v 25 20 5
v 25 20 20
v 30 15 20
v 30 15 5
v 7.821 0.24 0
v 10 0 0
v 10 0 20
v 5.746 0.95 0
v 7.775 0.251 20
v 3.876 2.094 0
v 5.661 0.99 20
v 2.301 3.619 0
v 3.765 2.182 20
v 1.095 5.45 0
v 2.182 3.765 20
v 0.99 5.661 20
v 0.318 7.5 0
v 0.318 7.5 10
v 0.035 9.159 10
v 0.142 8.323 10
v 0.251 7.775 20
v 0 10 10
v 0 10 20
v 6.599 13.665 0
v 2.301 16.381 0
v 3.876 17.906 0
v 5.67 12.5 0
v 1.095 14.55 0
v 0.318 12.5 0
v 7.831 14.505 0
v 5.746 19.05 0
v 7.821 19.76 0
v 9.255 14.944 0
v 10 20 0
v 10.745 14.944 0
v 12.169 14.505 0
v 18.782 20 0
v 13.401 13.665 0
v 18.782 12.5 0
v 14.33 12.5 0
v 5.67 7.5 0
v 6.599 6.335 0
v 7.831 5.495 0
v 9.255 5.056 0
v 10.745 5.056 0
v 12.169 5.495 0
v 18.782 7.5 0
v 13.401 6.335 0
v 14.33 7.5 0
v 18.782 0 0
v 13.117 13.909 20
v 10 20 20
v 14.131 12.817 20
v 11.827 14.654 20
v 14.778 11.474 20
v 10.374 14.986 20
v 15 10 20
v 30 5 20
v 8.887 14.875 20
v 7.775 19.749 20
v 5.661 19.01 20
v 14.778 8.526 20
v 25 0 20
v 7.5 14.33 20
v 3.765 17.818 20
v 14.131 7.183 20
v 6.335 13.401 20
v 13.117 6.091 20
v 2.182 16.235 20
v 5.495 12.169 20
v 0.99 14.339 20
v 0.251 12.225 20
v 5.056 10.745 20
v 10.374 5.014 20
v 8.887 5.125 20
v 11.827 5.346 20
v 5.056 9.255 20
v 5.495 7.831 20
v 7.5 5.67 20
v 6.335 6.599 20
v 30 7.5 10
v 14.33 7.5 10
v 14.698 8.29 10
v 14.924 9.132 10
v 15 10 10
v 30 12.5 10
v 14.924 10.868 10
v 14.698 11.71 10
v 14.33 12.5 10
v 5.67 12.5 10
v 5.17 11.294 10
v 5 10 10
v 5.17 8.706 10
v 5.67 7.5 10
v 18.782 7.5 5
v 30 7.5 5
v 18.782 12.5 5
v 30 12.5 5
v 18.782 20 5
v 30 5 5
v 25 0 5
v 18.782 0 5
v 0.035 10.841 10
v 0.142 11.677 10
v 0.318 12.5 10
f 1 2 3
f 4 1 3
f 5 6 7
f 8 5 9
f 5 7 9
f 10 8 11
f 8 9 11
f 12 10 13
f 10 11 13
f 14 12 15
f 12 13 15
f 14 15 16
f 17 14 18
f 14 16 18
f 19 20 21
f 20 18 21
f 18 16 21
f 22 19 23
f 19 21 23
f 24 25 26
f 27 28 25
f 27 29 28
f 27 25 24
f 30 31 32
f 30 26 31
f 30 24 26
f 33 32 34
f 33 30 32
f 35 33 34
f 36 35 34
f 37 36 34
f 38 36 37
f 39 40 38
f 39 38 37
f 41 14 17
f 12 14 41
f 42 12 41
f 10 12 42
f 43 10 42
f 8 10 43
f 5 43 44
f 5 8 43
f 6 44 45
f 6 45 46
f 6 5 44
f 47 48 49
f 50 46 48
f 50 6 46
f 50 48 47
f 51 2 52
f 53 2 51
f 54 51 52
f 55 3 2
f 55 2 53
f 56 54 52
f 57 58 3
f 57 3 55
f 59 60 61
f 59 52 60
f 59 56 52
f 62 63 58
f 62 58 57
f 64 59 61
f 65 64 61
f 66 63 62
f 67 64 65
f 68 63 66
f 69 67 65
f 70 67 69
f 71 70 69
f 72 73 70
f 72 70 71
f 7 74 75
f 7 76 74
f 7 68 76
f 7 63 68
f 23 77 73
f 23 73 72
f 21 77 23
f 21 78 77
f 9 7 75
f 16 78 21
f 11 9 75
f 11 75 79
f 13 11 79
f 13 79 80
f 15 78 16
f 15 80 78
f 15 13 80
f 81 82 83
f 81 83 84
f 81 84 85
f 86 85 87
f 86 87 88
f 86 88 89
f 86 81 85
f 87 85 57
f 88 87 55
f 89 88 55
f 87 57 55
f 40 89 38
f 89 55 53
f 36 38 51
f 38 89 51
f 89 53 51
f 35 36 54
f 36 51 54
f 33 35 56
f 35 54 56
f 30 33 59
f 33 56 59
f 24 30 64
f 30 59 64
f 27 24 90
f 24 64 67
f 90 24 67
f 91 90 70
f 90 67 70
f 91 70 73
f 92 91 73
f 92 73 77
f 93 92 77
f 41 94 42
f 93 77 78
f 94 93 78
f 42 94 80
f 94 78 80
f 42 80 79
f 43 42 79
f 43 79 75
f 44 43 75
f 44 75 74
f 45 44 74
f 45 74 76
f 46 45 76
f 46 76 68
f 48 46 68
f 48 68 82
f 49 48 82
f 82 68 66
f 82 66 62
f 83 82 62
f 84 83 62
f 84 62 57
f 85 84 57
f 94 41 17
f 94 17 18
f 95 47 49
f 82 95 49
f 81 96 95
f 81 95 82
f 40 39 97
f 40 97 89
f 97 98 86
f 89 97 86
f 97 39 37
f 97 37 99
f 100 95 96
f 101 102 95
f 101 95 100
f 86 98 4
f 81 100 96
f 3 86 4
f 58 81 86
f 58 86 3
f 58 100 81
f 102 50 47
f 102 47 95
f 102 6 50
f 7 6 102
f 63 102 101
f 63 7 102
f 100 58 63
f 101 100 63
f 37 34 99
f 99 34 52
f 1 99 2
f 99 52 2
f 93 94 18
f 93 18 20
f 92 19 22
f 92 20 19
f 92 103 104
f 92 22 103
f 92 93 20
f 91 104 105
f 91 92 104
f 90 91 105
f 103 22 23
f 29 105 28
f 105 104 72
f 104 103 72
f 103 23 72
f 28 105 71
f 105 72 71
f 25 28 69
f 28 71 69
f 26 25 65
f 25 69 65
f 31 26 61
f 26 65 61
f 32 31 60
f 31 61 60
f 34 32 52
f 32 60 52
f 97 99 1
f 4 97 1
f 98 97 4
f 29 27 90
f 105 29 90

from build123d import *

# Parameters (mm, degrees)
F1_DEPTH  = 20
F3_DEPTH  = 25
F4_DEPTH  = 25
F6_DEPTH  = 25
F7_DEPTH  = 25
F2_R      = 5
F8_DEPTH  = 30
F5_W      = 5
F5_H      = 5
F9_DEPTH  = 50
F10_DEPTH = 50


with BuildPart() as f1:
    # F0 (on Front) → F1 (new body)
    with BuildSketch(Plane.XZ):
        Polygon((0, 20), (0, 0), (18.7821621219, 0), (18.7821621219, 5), (30, 5), (30, 20), align=None)
    extrude(amount=-F1_DEPTH)

    # F2 (on face) → F3 (cut)
    with BuildSketch(Plane.XY.offset(20)):
        with BuildLine():
            ThreePointArc((0, 10), (2.9289321881, 17.0710678119), (10, 20))
            Line((10, 20), (0, 20))
            Line((0, 20), (0, 10))
        make_face()
    extrude(amount=-F3_DEPTH, mode=Mode.SUBTRACT)

    # F2 (on face) → F4 (cut)
    with BuildSketch(Plane.XY.offset(20)):
        with BuildLine():
            Line((0, 0), (10, 0))
            ThreePointArc((10, 0), (2.9289321881, 2.9289321881), (0, 10))
            Line((0, 10), (0, 0))
        make_face()
    extrude(amount=-F4_DEPTH, mode=Mode.SUBTRACT)

    # F2 (on face) → F6 (cut)
    with BuildSketch(Plane.XY.offset(20)):
        Polygon((30, 20), (25, 20), (30, 15), align=None)
    extrude(amount=-F6_DEPTH, mode=Mode.SUBTRACT)

    # F2 (on face) → F7 (cut)
    with BuildSketch(Plane.XY.offset(20)):
        Polygon((30, 5), (25, 0), (30, 0), align=None)
    extrude(amount=-F7_DEPTH, mode=Mode.SUBTRACT)

    # F2 (on face) → F8 (cut)
    with BuildSketch(Plane.XY.offset(20)):
        with Locations((10, 10)):
            Circle(F2_R)
    extrude(amount=-F8_DEPTH, mode=Mode.SUBTRACT)

    # F5 (on face) → F9 (cut)
    with BuildSketch(Plane.YZ.offset(30)):
        with Locations((10, 7.5)):
            Rectangle(F5_W, F5_H)
    extrude(amount=-F9_DEPTH, mode=Mode.SUBTRACT)

    # F5 (on face) → F10 (cut)
    with BuildSketch(Plane.YZ.offset(30)):
        with Locations((10, 2.5)):
            Rectangle(F5_W, F5_H)
    extrude(amount=-F10_DEPTH, mode=Mode.SUBTRACT)


solid = f1.part
